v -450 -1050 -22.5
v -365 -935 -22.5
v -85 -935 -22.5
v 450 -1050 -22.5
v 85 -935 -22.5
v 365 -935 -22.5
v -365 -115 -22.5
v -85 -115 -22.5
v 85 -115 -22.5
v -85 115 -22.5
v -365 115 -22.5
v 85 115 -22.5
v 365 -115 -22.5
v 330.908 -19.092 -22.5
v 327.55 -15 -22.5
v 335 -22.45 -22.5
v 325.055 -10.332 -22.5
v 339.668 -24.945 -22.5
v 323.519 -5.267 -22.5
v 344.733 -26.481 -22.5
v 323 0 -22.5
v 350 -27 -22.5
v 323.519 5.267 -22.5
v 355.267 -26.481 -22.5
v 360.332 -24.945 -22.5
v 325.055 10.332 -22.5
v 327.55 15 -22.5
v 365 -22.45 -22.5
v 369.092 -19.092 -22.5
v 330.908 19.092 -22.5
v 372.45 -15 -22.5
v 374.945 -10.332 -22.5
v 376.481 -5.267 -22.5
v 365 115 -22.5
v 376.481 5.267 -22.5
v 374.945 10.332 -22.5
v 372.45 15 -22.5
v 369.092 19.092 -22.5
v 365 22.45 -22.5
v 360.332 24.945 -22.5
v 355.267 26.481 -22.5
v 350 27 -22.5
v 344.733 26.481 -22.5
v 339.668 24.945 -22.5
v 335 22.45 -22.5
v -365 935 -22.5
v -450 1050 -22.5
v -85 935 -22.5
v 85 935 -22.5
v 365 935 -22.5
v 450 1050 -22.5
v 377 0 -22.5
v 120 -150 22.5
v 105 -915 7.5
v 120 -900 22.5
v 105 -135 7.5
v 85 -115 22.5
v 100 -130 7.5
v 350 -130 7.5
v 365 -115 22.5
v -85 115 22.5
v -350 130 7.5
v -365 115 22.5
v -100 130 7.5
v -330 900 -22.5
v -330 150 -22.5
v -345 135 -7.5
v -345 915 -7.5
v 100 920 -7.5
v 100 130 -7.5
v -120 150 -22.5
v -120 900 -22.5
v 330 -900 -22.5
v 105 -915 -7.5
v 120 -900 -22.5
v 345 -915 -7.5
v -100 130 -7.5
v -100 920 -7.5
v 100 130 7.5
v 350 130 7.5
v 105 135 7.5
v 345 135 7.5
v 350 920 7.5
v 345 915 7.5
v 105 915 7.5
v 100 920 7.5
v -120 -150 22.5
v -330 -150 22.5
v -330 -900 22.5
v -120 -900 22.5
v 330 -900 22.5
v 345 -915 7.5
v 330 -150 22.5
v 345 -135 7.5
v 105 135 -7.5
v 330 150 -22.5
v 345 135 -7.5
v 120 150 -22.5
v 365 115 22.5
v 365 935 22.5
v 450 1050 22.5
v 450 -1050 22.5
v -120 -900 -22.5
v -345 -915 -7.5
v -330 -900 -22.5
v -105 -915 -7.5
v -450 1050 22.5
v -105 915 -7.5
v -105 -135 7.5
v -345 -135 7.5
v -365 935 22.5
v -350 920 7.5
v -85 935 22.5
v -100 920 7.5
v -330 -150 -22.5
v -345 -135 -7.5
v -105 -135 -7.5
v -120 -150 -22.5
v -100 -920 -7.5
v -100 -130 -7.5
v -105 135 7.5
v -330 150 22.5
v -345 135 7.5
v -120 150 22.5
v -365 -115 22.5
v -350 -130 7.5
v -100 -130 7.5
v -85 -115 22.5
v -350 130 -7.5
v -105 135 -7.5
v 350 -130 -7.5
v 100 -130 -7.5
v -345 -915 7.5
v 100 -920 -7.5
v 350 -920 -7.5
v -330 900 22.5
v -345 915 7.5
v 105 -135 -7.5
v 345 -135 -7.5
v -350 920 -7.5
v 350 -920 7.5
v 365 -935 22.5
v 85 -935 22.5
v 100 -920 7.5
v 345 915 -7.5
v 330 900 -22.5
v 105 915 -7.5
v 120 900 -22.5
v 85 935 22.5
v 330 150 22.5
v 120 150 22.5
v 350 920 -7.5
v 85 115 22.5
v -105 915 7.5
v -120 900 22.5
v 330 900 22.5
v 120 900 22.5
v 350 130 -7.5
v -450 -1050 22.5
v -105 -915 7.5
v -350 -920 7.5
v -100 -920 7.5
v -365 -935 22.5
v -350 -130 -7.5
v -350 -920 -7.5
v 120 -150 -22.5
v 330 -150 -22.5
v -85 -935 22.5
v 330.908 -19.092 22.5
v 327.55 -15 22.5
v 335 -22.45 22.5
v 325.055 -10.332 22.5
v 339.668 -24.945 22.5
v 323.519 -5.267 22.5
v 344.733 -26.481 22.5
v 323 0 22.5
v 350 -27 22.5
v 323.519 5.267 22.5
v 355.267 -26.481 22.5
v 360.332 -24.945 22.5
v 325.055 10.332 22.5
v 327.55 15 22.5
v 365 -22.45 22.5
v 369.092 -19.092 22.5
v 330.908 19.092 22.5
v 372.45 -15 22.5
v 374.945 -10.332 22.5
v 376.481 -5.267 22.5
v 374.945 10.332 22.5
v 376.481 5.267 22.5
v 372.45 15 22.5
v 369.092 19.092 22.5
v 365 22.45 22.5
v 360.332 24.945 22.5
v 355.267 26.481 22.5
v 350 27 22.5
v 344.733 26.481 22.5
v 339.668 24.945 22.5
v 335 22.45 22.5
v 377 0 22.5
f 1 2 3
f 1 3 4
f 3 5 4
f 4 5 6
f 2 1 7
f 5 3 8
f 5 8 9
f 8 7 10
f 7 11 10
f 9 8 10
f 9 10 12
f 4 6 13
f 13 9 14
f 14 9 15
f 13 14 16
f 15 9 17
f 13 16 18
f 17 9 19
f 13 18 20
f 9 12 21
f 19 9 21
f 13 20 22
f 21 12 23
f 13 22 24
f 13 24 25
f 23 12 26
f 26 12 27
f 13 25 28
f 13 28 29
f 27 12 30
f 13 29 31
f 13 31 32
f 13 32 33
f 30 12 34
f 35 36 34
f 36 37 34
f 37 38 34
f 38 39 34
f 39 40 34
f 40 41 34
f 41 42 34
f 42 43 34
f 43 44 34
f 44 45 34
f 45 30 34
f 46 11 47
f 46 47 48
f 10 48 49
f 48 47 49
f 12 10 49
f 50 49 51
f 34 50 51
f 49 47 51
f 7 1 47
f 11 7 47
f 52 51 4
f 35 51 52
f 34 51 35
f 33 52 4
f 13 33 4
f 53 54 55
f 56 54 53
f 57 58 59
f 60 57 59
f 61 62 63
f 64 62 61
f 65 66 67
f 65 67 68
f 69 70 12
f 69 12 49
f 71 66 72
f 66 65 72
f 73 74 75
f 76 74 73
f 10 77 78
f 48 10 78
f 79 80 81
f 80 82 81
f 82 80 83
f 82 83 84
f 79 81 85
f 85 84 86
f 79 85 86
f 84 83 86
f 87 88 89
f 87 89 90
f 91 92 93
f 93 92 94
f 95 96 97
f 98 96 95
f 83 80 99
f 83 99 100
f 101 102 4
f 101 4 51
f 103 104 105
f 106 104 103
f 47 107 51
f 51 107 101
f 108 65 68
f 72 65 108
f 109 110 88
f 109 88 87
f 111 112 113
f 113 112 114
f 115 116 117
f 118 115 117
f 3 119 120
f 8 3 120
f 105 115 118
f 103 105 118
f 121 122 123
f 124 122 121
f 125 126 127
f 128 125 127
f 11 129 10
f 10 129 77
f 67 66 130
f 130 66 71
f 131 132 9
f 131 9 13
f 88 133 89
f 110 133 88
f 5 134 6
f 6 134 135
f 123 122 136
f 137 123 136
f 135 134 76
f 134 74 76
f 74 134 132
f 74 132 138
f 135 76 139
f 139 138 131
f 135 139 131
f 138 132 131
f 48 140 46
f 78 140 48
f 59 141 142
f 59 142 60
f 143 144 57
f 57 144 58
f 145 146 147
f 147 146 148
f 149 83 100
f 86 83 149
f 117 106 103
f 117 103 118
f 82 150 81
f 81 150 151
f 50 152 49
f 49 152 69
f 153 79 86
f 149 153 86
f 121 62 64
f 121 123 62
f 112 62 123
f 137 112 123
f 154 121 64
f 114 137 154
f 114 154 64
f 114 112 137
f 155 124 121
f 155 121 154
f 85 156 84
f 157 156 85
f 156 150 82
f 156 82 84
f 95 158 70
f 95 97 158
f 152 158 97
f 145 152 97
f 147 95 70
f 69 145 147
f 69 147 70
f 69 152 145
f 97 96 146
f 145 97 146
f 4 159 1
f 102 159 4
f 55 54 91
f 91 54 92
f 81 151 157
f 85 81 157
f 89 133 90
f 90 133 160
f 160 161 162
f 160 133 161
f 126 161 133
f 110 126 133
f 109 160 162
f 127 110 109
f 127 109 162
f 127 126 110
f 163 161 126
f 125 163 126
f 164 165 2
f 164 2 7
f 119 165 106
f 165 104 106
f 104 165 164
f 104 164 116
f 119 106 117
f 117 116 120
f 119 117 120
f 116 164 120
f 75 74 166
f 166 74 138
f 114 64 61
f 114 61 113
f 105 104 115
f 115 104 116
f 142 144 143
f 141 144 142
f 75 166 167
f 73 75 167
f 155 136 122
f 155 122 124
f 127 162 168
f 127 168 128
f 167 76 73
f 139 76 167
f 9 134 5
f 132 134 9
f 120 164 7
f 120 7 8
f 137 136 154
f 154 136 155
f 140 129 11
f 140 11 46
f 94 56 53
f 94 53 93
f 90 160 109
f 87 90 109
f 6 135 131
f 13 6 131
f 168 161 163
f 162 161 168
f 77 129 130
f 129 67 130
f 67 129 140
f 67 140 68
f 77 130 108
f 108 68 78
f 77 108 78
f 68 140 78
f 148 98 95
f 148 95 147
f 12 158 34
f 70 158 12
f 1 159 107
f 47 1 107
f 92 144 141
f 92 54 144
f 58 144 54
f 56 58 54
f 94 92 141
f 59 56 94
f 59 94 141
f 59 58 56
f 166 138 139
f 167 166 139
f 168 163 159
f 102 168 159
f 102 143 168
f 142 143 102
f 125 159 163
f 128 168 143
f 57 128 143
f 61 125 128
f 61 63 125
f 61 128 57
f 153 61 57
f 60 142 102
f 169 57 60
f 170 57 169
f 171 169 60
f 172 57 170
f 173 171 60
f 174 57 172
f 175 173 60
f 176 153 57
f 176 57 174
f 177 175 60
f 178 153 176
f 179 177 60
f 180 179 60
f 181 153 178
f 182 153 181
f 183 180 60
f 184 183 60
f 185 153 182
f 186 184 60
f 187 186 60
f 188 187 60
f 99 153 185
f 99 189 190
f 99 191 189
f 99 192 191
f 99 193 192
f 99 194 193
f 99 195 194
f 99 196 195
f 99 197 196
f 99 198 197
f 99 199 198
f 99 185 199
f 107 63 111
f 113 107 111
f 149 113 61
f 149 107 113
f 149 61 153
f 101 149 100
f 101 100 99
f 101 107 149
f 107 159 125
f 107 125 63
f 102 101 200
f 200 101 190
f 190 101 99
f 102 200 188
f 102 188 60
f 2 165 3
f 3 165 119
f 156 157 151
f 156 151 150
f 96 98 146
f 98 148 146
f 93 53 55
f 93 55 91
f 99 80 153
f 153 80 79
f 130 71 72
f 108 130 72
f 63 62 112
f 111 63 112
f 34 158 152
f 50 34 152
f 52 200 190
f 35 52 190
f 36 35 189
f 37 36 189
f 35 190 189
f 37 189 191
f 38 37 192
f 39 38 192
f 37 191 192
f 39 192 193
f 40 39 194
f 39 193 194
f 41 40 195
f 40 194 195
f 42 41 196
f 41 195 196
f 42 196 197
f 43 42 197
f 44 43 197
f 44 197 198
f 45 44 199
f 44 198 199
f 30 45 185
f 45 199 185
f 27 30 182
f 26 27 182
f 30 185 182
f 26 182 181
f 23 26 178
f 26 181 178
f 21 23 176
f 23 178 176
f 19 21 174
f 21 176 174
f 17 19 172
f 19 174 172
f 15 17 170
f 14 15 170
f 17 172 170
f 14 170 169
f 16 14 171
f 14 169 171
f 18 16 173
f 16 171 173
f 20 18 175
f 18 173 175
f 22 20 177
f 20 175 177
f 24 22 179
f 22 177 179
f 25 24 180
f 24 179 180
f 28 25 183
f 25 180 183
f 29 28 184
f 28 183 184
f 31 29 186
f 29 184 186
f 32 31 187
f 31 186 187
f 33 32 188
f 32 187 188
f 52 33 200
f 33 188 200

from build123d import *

# Parameters (mm, degrees)
SKETCH1_W                  = 900
SKETCH1_H                  = 2100
BOSS_EXTRUDE1_DEPTH        = 22.5
SKETCH2_W                  = 250
SKETCH2_H                  = 790
SKETCH2_W_2                = 240
SKETCH2_H_2                = 780
CUT_EXTRUDE1_DEPTH         = 15
CHAMFER1_SIZE              = 15
CHAMFER1_OF_MIRROR1_SIZE   = 15
MIRROR2_OUTLINE_W          = 250
MIRROR2_OUTLINE_H          = 790
MIRROR2_OUTLINE_W_2        = 240
MIRROR2_OUTLINE_H_2        = 780
MIRROR2_DEPTH              = 15
MIRROR2_DRAFT              = -45
MIRROR2_2_OUTLINE_W        = 250
MIRROR2_2_OUTLINE_H        = 790
MIRROR2_2_OUTLINE_W_2      = 240
MIRROR2_2_OUTLINE_H_2      = 780
MIRROR2_2_DEPTH            = 15
MIRROR2_2_DRAFT            = -45
CHAMFER2_SIZE              = 15
MIRROR10_COPY_1_SKETCH_W   = 250
MIRROR10_COPY_1_SKETCH_H   = 790
MIRROR10_COPY_1_SKETCH_W_2 = 240
MIRROR10_COPY_1_SKETCH_H_2 = 780
MIRROR10_COPY_1_DEPTH      = 15
MIRROR10_COPY_2_SKETCH_W   = 250
MIRROR10_COPY_2_SKETCH_H   = 790
MIRROR10_COPY_2_SKETCH_W_2 = 240
MIRROR10_COPY_2_SKETCH_H_2 = 780
MIRROR10_COPY_2_DEPTH      = 15
CHAMFER2_OF_MIRROR10_SIZE  = 15
MIRROR11_OUTLINE_W         = 250
MIRROR11_OUTLINE_H         = 790
MIRROR11_OUTLINE_W_2       = 240
MIRROR11_OUTLINE_H_2       = 780
MIRROR11_DEPTH             = 15
MIRROR11_DRAFT             = 45
MIRROR11_2_OUTLINE_W       = 250
MIRROR11_2_OUTLINE_H       = 790
MIRROR11_2_OUTLINE_W_2     = 240
MIRROR11_2_OUTLINE_H_2     = 780
MIRROR11_2_DEPTH           = 15
MIRROR11_2_DRAFT           = 45
SKETCH4_R                  = 27
CUT_EXTRUDE2_DEPTH         = 45


# Read off the part's stored shape, not the designer's step: Mirror2, Mirror11
with BuildPart() as part:
    # Sketch1 → Boss-Extrude1 (new, symmetric)
    with BuildSketch(Plane.XY):
        Rectangle(SKETCH1_W, SKETCH1_H)
    extrude(amount=BOSS_EXTRUDE1_DEPTH, both=True)

    # Sketch2 → Cut-Extrude1 (cut)
    with BuildSketch(Plane.XY.offset(22.5)):
        with Locations((-225, 525)):
            Rectangle(SKETCH2_W, SKETCH2_H)
        with Locations((-225, 525)):
            Rectangle(SKETCH2_W_2, SKETCH2_H_2, mode=Mode.SUBTRACT)
    cut_extrude1 = extrude(amount=-CUT_EXTRUDE1_DEPTH, mode=Mode.SUBTRACT)

    # Chamfer1
    chamfer1_edges = [part.edges().sort_by_distance(p)[0] for p in [
        (-225, 915, 22.5),
        (-105, 525, 22.5),
        (-345, 525, 22.5),
        (-225, 135, 22.5),
        (-225, 920, 22.5),
        (-100, 525, 22.5),
        (-225, 130, 22.5),
        (-350, 525, 22.5),
    ]]
    chamfer(chamfer1_edges, length=CHAMFER1_SIZE - 0.0001)  # a hair under: the kernel refuses the full size

    # Mirror1: Cut-Extrude1 across plane
    add(cut_extrude1.mirror(Plane(origin=(0, 0, 0), x_dir=(0, 0, 1), z_dir=(1, 0, 0))), mode=Mode.SUBTRACT)

    # Chamfer1 of Mirror1
    chamfer1_of_mirror1_edges = [part.edges().sort_by_distance(p)[0] for p in [
        (225, 915, 22.5),
        (105, 525, 22.5),
        (345, 525, 22.5),
        (225, 135, 22.5),
        (225, 920, 22.5),
        (100, 525, 22.5),
        (225, 130, 22.5),
        (350, 525, 22.5),
    ]]
    chamfer(chamfer1_of_mirror1_edges, length=CHAMFER1_OF_MIRROR1_SIZE - 0.0001)  # a hair under: the kernel refuses the full size


with BuildPart() as mirror2_tool:
    # Mirror2 outline → Mirror2 (with draft: the straight prism first)
    with BuildSketch(Plane.XY.offset(7.5)):
        with Locations((-225, -525)):
            Rectangle(MIRROR2_OUTLINE_W, MIRROR2_OUTLINE_H)
        with Locations((-225, -525)):
            Rectangle(MIRROR2_OUTLINE_W_2, MIRROR2_OUTLINE_H_2, mode=Mode.SUBTRACT)
    extrude(amount=MIRROR2_DEPTH)
    # Mirror2: the draft: its side faces are tilted about the plane it starts from
    mirror2_sides = [mirror2_tool.faces().sort_by_distance(p)[0] for p in [
        (-350, -525, 15),
        (-225, -920, 15),
        (-100, -525, 15),
        (-225, -130, 15),
        (-225, -915, 15),
        (-345, -525, 15),
        (-225, -135, 15),
        (-105, -525, 15),
    ]]
    draft(mirror2_sides, Plane.XY.offset(7.5), MIRROR2_DRAFT)


with BuildPart() as part_1:
    add(part.part)

    # Mirror2: cut by mirror2_tool
    add(mirror2_tool.part, mode=Mode.SUBTRACT)


with BuildPart() as mirror2_2_tool:
    # Mirror2 2 outline → Mirror2 2 (with draft: the straight prism first)
    with BuildSketch(Plane.XY.offset(7.5)):
        with Locations((225, -525)):
            Rectangle(MIRROR2_2_OUTLINE_W, MIRROR2_2_OUTLINE_H)
        with Locations((225, -525)):
            Rectangle(MIRROR2_2_OUTLINE_W_2, MIRROR2_2_OUTLINE_H_2, mode=Mode.SUBTRACT)
    extrude(amount=MIRROR2_2_DEPTH)
    # Mirror2 2: the draft: its side faces are tilted about the plane it starts from
    mirror2_2_sides = [mirror2_2_tool.faces().sort_by_distance(p)[0] for p in [
        (350, -525, 15),
        (225, -130, 15),
        (100, -525, 15),
        (225, -920, 15),
        (105, -525, 15),
        (225, -135, 15),
        (345, -525, 15),
        (225, -915, 15),
    ]]
    draft(mirror2_2_sides, Plane.XY.offset(7.5), MIRROR2_2_DRAFT)


with BuildPart() as part_2:
    add(part_1.part)

    # Mirror2 2: cut by mirror2_2_tool
    add(mirror2_2_tool.part, mode=Mode.SUBTRACT)

    # Mirror5: Cut-Extrude1 across plane
    add(cut_extrude1.mirror(Plane.XY), mode=Mode.SUBTRACT)

    # Chamfer2
    chamfer2_edges = [part_2.edges().sort_by_distance(p)[0] for p in [
        (-225, 130, -22.5),
        (-350, 525, -22.5),
        (-100, 525, -22.5),
        (-225, 920, -22.5),
        (-225, 135, -22.5),
        (-345, 525, -22.5),
        (-105, 525, -22.5),
        (-225, 915, -22.5),
    ]]
    chamfer(chamfer2_edges, length=CHAMFER2_SIZE - 0.0001)  # a hair under: the kernel refuses the full size

    # Mirror10 copy 1 sketch → Mirror10 copy 1 (cut)
    with BuildSketch(Plane(origin=(0, 0, -22.5), x_dir=(-1, 0, 0), z_dir=(0, 0, -1))):
        with Locations((-225, 525)):
            Rectangle(MIRROR10_COPY_1_SKETCH_W, MIRROR10_COPY_1_SKETCH_H)
        with Locations((-225, 525)):
            Rectangle(MIRROR10_COPY_1_SKETCH_W_2, MIRROR10_COPY_1_SKETCH_H_2, mode=Mode.SUBTRACT)
    extrude(amount=-MIRROR10_COPY_1_DEPTH, mode=Mode.SUBTRACT)

    # Mirror10 copy 2 sketch → Mirror10 copy 2 (cut)
    with BuildSketch(Plane(origin=(0, 0, 22.5), x_dir=(-1, 0, 0), z_dir=(0, 0, 1))):
        with Locations((-225, -525)):
            Rectangle(MIRROR10_COPY_2_SKETCH_W, MIRROR10_COPY_2_SKETCH_H)
        with Locations((-225, -525)):
            Rectangle(MIRROR10_COPY_2_SKETCH_W_2, MIRROR10_COPY_2_SKETCH_H_2, mode=Mode.SUBTRACT)
    extrude(amount=-MIRROR10_COPY_2_DEPTH, mode=Mode.SUBTRACT)

    # Chamfer2 of Mirror10
    chamfer2_of_mirror10_edges = [part_2.edges().sort_by_distance(p)[0] for p in [
        (225, 130, -22.5),
        (350, 525, -22.5),
        (100, 525, -22.5),
        (225, 920, -22.5),
        (225, 135, -22.5),
        (345, 525, -22.5),
        (105, 525, -22.5),
        (225, 915, -22.5),
    ]]
    chamfer(chamfer2_of_mirror10_edges, length=CHAMFER2_OF_MIRROR10_SIZE - 0.0001)  # a hair under: the kernel refuses the full size


with BuildPart() as mirror11_tool:
    # Mirror11 outline → Mirror11 (with draft: the straight prism first)
    with BuildSketch(Plane.XY.offset(-7.5)):
        with Locations((-225, -525)):
            Rectangle(MIRROR11_OUTLINE_W, MIRROR11_OUTLINE_H)
        with Locations((-225, -525)):
            Rectangle(MIRROR11_OUTLINE_W_2, MIRROR11_OUTLINE_H_2, mode=Mode.SUBTRACT)
    extrude(amount=-MIRROR11_DEPTH)
    # Mirror11: the draft: its side faces are tilted about the plane it starts from
    mirror11_sides = [mirror11_tool.faces().sort_by_distance(p)[0] for p in [
        (-225, -920, -15),
        (-100, -525, -15),
        (-225, -130, -15),
        (-350, -525, -15),
        (-225, -915, -15),
        (-345, -525, -15),
        (-225, -135, -15),
        (-105, -525, -15),
    ]]
    draft(mirror11_sides, Plane.XY.offset(-7.5), MIRROR11_DRAFT)


with BuildPart() as part_3:
    add(part_2.part)

    # Mirror11: cut by mirror11_tool
    add(mirror11_tool.part, mode=Mode.SUBTRACT)


with BuildPart() as mirror11_2_tool:
    # Mirror11 2 outline → Mirror11 2 (with draft: the straight prism first)
    with BuildSketch(Plane.XY.offset(-7.5)):
        with Locations((225, -525)):
            Rectangle(MIRROR11_2_OUTLINE_W, MIRROR11_2_OUTLINE_H)
        with Locations((225, -525)):
            Rectangle(MIRROR11_2_OUTLINE_W_2, MIRROR11_2_OUTLINE_H_2, mode=Mode.SUBTRACT)
    extrude(amount=-MIRROR11_2_DEPTH)
    # Mirror11 2: the draft: its side faces are tilted about the plane it starts from
    mirror11_2_sides = [mirror11_2_tool.faces().sort_by_distance(p)[0] for p in [
        (225, -130, -15),
        (100, -525, -15),
        (225, -920, -15),
        (350, -525, -15),
        (105, -525, -15),
        (225, -135, -15),
        (345, -525, -15),
        (225, -915, -15),
    ]]
    draft(mirror11_2_sides, Plane.XY.offset(-7.5), MIRROR11_2_DRAFT)


with BuildPart() as part_4:
    add(part_3.part)

    # Mirror11 2: cut by mirror11_2_tool
    add(mirror11_2_tool.part, mode=Mode.SUBTRACT)

    # Sketch4 → Cut-Extrude2 (cut)
    with BuildSketch(Plane.XY.offset(22.5)):
        with Locations((350, 0)):
            Circle(SKETCH4_R)
    extrude(amount=-CUT_EXTRUDE2_DEPTH, mode=Mode.SUBTRACT)


solid = part_4.part
